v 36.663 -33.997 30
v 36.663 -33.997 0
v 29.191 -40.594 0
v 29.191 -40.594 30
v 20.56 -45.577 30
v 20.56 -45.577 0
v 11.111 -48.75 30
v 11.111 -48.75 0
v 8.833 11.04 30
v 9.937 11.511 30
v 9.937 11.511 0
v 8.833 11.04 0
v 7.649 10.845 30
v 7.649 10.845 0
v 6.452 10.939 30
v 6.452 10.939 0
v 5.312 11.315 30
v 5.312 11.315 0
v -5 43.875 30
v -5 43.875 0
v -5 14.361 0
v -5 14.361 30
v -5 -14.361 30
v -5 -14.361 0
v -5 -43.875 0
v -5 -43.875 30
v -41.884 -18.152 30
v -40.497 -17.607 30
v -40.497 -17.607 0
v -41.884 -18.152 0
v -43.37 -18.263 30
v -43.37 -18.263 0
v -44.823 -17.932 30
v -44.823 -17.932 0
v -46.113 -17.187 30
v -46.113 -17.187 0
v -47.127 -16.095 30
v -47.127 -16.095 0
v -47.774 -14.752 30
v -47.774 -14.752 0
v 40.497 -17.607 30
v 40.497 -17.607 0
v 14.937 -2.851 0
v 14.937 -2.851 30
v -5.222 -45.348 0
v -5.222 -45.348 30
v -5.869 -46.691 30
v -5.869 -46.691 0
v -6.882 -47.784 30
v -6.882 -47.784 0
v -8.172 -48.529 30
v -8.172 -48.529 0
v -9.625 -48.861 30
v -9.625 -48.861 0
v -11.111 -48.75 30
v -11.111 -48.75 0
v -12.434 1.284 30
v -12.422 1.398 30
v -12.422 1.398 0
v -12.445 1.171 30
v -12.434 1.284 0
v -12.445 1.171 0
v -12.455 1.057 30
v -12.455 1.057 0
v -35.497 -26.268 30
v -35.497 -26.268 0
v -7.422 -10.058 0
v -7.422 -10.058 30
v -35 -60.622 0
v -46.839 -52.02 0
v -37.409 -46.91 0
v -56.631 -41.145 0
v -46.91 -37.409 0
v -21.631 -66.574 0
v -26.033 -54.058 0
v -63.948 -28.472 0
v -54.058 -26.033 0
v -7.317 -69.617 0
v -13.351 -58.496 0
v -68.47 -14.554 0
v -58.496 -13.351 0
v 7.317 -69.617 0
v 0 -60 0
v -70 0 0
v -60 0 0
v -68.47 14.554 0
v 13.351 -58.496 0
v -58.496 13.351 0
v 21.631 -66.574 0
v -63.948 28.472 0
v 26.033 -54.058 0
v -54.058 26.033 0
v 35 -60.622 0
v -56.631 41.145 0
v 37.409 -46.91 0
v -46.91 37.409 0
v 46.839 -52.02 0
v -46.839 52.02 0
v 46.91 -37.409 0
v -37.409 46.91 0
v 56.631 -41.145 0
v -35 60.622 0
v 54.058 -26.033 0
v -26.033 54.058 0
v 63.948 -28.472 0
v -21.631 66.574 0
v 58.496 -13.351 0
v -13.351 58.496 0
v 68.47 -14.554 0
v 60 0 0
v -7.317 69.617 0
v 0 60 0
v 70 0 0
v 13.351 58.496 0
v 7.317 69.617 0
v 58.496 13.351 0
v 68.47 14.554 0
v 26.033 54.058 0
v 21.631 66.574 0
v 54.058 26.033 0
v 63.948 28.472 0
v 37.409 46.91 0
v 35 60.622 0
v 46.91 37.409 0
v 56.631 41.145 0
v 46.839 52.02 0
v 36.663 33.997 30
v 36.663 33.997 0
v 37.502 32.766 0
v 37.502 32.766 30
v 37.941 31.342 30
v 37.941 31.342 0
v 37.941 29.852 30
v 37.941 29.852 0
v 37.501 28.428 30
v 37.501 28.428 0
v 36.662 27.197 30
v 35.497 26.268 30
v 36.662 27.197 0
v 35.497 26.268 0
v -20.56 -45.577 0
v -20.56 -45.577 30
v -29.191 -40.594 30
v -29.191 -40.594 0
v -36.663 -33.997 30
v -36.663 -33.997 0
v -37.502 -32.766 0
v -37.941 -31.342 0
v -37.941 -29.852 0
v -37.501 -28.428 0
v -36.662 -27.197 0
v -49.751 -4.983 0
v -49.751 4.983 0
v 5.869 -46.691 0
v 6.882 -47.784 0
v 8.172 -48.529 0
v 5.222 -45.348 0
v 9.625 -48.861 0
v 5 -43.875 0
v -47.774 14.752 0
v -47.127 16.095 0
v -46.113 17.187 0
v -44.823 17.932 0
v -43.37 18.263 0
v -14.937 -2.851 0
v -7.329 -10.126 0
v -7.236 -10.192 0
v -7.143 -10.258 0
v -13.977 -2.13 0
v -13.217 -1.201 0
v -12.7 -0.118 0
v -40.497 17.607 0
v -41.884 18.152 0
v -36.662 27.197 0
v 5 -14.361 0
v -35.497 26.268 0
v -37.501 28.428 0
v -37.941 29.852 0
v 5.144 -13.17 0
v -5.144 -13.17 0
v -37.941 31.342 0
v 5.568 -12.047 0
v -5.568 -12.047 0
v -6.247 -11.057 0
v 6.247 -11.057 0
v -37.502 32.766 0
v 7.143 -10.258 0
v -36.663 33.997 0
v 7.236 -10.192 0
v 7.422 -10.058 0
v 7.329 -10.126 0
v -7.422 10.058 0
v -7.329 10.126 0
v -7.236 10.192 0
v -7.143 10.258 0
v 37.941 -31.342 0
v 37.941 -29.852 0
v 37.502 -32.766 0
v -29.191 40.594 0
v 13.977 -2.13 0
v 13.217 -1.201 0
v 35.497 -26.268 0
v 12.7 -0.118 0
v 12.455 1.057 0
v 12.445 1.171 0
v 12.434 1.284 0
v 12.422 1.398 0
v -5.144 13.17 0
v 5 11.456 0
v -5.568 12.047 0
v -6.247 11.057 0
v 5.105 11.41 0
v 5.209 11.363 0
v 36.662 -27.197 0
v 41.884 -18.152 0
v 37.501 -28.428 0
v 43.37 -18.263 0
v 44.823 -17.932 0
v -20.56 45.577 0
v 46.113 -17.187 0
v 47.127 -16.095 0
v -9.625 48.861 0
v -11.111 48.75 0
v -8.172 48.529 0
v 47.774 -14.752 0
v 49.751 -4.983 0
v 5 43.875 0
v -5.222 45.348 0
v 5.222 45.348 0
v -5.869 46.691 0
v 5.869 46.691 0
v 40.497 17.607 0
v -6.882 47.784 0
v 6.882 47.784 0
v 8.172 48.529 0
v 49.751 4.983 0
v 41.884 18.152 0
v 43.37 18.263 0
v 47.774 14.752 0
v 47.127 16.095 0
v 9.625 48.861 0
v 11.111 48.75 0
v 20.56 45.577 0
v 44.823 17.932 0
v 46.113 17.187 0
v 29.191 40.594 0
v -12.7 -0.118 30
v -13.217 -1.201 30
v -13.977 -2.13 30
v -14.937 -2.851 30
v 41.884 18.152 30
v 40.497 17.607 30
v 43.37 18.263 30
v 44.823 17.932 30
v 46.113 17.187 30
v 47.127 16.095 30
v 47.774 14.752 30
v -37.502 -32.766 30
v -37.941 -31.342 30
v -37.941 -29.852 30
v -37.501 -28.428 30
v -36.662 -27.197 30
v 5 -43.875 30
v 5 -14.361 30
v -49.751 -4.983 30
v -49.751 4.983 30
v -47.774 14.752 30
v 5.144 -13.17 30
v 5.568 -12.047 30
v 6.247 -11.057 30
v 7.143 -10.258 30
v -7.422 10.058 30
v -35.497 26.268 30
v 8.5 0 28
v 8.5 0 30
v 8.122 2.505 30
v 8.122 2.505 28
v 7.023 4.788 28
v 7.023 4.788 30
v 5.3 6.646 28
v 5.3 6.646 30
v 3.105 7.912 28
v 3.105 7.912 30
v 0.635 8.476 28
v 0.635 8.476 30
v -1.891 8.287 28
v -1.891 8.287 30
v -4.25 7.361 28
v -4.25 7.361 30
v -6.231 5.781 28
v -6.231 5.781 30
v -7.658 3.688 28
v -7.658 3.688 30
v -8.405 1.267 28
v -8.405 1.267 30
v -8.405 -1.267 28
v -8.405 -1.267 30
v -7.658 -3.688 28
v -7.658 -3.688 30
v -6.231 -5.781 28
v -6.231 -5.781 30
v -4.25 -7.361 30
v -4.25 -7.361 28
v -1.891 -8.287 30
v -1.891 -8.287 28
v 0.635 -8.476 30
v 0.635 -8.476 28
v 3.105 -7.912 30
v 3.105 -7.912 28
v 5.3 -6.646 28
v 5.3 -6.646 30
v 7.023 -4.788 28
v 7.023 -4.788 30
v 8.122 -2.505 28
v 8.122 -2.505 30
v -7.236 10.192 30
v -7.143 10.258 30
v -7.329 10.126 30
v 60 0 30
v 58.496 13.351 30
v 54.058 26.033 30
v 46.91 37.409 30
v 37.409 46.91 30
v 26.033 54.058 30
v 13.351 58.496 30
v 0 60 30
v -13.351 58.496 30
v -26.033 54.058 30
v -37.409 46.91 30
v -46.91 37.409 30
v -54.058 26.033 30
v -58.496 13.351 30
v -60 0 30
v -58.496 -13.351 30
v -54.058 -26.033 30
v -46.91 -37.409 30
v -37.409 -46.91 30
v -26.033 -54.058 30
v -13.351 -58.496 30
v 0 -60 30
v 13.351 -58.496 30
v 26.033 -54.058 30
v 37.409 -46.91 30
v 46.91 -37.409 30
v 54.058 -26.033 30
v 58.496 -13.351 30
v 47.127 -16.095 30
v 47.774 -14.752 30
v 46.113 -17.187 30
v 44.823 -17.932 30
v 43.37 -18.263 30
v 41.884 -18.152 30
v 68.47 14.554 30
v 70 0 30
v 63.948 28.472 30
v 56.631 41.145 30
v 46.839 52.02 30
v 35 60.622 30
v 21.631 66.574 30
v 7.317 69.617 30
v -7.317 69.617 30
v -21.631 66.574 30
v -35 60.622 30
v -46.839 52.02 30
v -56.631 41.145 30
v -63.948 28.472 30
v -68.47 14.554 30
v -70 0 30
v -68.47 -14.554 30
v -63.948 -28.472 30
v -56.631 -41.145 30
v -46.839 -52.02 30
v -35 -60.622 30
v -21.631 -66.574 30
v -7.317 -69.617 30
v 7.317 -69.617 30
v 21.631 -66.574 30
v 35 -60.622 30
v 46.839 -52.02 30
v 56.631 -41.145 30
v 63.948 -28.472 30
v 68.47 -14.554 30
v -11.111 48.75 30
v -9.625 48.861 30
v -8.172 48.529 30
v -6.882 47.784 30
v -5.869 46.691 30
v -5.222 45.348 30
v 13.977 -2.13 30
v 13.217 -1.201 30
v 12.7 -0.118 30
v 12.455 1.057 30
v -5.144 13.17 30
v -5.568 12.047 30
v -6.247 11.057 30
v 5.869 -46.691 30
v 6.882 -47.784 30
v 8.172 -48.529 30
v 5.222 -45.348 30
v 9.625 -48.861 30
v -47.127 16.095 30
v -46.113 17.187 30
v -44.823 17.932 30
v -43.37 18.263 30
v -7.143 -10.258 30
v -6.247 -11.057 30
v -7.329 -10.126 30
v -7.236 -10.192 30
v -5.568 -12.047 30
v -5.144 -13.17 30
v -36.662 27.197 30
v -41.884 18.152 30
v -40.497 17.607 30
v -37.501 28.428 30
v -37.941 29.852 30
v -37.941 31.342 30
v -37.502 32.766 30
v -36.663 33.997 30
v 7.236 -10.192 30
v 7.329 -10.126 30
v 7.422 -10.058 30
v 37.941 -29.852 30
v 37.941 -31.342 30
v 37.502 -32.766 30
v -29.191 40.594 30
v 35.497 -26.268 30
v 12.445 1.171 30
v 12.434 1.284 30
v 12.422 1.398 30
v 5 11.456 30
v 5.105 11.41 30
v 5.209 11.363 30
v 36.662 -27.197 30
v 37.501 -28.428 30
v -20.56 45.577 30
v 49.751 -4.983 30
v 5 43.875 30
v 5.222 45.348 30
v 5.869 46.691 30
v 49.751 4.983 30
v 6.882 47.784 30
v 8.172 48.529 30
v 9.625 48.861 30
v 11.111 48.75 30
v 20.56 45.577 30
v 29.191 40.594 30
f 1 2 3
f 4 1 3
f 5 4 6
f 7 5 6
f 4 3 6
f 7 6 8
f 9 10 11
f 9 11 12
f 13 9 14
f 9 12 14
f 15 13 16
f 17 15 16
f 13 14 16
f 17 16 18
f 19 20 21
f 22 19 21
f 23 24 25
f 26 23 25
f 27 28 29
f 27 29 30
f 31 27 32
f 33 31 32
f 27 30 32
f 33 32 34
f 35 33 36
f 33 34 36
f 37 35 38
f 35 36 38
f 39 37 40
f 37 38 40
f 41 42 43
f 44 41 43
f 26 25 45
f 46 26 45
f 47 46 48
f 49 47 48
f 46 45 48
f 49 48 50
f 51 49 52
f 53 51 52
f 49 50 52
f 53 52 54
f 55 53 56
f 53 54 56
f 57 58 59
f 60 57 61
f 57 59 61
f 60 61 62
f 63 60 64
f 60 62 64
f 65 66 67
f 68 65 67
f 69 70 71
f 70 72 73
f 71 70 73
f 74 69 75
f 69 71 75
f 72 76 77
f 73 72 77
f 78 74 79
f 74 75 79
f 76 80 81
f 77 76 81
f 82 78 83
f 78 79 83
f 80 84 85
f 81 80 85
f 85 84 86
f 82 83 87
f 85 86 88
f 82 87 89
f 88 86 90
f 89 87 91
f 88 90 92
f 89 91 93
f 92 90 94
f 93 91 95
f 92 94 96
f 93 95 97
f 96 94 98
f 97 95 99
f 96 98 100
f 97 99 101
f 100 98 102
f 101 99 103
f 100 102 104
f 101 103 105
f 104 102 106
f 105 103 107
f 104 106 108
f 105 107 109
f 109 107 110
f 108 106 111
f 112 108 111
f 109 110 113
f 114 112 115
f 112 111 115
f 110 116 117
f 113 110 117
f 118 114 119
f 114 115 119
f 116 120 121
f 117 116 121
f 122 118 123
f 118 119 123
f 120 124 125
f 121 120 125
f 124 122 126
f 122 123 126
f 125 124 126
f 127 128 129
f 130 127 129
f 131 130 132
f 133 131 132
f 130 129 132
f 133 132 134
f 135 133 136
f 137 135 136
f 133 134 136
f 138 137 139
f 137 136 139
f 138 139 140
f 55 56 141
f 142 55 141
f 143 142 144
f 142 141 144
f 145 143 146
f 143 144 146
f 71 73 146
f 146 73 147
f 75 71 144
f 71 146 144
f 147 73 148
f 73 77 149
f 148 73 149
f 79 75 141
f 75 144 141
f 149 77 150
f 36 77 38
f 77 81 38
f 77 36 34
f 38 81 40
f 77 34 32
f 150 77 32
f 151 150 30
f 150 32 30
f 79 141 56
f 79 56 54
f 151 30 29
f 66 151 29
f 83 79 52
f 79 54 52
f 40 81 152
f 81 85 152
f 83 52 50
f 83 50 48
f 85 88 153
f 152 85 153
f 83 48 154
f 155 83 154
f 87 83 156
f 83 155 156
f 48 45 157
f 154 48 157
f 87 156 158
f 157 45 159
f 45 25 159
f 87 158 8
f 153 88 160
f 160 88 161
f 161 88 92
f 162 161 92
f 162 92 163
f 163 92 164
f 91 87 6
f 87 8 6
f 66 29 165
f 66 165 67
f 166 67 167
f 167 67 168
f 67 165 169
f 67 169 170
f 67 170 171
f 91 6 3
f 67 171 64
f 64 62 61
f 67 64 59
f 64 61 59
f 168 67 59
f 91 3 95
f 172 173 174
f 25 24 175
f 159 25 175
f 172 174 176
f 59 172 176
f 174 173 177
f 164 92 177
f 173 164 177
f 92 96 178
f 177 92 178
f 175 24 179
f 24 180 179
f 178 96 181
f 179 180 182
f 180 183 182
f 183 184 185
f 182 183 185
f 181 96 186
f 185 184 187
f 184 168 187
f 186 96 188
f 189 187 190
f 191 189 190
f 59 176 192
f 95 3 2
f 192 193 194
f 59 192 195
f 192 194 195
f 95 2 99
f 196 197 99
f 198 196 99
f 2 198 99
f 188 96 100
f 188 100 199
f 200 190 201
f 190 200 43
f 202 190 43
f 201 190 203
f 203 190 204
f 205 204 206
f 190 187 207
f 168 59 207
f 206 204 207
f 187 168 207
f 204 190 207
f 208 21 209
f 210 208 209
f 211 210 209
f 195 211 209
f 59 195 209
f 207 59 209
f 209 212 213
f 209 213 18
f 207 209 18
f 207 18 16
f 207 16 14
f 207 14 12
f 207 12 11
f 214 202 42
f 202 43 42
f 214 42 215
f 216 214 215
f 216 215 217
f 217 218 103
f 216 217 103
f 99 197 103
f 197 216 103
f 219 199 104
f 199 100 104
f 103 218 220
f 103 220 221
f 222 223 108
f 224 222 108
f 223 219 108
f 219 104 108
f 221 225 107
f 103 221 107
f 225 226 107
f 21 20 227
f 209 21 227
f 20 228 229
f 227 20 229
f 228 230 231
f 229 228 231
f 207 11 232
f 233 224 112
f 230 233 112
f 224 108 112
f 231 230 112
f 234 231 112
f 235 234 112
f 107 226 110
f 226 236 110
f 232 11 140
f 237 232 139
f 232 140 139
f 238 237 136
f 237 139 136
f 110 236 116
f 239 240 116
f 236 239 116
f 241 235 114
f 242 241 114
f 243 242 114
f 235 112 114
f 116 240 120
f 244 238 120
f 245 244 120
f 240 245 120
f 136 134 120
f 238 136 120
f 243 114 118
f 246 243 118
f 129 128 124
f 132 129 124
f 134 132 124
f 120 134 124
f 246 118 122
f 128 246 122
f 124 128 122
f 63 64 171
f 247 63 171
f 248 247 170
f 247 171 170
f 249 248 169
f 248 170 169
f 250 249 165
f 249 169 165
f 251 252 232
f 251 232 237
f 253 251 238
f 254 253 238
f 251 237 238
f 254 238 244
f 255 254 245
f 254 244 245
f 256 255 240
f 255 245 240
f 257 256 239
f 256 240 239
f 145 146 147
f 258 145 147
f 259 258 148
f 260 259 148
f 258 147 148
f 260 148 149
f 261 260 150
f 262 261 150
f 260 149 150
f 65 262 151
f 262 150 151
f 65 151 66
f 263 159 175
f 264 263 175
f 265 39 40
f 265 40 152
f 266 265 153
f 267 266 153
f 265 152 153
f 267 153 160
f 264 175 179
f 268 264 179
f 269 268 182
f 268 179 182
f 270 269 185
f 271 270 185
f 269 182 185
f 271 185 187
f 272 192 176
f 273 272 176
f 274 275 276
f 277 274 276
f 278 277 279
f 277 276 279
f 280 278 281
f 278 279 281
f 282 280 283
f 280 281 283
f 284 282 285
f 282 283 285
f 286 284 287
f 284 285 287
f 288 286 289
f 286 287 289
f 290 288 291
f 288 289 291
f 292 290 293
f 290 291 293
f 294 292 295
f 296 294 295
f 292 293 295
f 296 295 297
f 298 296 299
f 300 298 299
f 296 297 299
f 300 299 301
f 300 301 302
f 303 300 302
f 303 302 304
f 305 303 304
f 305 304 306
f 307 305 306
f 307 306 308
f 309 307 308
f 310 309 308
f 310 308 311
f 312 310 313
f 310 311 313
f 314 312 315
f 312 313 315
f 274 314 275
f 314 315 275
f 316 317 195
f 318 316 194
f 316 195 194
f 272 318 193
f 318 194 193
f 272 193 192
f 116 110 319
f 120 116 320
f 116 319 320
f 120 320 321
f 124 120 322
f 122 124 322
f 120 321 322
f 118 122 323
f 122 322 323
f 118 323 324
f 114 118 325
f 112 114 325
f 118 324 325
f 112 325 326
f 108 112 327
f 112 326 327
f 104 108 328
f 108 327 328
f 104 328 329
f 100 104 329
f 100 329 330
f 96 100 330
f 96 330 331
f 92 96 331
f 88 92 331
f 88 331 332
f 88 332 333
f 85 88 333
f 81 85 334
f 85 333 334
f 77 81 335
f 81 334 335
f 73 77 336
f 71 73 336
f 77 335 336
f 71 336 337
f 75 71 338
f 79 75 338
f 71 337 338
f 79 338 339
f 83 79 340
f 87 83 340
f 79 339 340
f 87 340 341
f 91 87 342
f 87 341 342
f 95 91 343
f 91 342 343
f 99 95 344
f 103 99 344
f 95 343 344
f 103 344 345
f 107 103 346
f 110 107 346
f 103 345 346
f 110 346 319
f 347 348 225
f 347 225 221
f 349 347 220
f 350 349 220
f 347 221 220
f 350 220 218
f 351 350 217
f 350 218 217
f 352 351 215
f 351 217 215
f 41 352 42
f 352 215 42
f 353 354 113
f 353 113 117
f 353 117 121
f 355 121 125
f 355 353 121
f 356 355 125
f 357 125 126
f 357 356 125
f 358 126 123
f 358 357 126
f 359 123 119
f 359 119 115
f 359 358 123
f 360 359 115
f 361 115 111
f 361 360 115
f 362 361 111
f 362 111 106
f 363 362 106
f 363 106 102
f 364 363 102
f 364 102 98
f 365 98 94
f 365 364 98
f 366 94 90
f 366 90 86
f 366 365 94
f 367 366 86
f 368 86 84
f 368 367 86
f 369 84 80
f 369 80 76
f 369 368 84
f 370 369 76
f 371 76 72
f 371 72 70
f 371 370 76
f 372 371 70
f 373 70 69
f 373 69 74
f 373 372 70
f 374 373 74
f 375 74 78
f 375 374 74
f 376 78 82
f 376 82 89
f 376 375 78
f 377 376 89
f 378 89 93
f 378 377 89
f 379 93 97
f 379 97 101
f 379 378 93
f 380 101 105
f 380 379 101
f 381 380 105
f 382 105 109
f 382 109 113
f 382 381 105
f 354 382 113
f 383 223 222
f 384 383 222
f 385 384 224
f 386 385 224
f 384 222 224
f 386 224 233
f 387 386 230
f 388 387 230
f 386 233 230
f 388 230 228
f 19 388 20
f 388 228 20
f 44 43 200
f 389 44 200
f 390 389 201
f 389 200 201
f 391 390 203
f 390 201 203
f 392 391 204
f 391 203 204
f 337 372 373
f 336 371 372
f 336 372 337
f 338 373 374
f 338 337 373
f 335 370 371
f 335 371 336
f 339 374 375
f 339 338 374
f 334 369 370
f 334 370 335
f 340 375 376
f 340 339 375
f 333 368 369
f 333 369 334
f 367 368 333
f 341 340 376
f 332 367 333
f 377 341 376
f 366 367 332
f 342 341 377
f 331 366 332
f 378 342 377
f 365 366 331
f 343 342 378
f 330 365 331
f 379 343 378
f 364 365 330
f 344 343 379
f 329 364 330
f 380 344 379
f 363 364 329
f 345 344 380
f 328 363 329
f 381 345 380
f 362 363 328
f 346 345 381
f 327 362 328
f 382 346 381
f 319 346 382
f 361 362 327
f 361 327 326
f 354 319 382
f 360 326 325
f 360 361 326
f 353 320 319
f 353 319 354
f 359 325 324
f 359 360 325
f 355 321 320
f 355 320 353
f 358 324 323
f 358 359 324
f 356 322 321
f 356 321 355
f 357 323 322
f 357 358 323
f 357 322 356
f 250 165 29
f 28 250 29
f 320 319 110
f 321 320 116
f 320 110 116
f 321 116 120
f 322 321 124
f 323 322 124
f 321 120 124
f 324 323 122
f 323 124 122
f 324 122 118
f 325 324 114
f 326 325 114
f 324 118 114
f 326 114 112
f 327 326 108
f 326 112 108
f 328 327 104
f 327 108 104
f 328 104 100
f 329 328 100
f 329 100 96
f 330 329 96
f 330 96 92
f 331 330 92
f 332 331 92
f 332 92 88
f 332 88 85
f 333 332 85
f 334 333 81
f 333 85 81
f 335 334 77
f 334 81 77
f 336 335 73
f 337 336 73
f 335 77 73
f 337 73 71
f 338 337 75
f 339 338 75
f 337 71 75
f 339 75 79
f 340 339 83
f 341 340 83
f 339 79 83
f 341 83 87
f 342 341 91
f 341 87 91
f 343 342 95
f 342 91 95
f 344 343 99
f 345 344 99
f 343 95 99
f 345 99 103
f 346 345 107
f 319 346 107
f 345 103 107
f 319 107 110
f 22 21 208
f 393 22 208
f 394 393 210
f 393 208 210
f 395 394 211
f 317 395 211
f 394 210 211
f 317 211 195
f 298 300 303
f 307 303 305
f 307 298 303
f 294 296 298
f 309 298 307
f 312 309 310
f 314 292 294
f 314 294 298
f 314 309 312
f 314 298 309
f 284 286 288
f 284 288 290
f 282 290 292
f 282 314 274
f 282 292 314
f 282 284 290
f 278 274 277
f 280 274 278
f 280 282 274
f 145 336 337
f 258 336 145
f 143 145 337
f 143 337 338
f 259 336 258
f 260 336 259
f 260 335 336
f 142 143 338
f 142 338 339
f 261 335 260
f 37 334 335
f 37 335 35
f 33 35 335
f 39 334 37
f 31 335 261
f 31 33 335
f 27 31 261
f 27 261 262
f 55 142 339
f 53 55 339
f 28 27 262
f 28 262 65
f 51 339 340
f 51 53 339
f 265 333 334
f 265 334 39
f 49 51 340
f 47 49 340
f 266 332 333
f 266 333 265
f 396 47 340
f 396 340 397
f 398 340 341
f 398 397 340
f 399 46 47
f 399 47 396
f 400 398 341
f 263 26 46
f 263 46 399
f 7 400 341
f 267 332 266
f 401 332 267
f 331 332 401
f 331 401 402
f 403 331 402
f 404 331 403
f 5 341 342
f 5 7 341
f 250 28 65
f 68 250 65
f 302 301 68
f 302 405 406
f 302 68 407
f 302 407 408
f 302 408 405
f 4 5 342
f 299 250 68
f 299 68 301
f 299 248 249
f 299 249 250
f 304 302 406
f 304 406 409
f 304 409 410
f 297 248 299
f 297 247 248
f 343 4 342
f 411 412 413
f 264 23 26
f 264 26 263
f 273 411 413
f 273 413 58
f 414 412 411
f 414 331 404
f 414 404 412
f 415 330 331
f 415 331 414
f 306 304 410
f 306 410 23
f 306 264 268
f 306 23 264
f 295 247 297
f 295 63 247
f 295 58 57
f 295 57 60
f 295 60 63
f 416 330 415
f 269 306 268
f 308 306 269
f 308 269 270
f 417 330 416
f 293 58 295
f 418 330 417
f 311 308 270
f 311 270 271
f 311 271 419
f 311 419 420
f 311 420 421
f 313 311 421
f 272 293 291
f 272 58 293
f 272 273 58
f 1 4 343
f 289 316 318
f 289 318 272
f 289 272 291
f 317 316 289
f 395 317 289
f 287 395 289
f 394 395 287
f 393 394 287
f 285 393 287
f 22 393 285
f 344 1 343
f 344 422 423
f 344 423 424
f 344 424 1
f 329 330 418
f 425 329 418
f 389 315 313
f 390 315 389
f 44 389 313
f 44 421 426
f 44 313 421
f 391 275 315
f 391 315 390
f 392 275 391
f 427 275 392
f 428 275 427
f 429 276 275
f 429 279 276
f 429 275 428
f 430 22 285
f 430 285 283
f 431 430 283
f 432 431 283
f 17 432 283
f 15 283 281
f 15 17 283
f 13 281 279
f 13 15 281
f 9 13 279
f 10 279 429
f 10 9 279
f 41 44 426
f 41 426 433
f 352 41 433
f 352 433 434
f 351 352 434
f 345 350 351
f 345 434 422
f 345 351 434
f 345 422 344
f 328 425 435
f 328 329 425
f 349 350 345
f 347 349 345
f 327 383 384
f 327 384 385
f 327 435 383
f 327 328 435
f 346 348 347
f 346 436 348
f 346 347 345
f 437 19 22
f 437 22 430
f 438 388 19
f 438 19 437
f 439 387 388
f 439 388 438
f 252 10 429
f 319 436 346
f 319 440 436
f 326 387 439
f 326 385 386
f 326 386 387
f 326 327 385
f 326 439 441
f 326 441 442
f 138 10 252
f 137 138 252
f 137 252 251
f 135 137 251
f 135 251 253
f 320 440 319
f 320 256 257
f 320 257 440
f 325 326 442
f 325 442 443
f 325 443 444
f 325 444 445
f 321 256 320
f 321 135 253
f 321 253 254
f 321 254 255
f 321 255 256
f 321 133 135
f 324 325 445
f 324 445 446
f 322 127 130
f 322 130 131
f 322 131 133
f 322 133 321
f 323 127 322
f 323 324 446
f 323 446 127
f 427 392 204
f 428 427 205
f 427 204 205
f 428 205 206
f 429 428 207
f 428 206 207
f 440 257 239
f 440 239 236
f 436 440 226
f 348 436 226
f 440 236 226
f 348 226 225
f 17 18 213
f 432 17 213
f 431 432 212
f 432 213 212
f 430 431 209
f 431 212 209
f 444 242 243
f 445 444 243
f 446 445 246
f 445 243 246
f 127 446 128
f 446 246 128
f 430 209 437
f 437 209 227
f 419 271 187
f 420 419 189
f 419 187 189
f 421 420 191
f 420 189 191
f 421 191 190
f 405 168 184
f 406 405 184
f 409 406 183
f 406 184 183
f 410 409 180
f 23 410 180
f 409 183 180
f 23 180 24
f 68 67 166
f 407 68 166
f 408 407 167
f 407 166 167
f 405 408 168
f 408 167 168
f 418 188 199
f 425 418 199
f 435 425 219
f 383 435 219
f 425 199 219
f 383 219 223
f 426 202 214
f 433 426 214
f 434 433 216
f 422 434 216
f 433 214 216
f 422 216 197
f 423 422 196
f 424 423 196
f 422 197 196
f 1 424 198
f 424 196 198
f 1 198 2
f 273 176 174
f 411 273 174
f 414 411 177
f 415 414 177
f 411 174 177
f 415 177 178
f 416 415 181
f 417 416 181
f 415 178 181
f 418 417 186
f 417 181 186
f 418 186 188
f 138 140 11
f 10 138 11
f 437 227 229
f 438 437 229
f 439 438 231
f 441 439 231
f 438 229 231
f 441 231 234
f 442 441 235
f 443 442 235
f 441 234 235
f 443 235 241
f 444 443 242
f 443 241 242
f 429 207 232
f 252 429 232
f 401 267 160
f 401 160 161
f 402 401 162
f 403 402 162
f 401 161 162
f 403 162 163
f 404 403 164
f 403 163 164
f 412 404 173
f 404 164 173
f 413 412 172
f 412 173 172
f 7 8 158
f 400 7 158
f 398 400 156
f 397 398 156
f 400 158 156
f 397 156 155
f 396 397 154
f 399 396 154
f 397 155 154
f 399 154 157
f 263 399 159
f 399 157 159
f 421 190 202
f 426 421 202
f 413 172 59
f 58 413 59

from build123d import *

# Parameters (mm, degrees)
SKETCH_1_R          = 60
EXTRUDE_1_DEPTH     = 30
SKETCH_2_R          = 70
SKETCH_2_R_2        = 60
EXTRUDE_2_DEPTH     = 30
SKETCH_3_R          = 8.5
CUT_EXTRUDE_1_DEPTH = 2


with BuildPart() as part:
    # ｽｹｯﾁ1 → ﾎﾞｽ - 押し出し1 (new body)
    with BuildSketch(Plane.XY):
        Circle(SKETCH_1_R)
        with BuildLine():
            Line((-5, 43.874821937), (-5, 14.361406616))
            ThreePointArc((-5, 14.361406616), (-5.567973698, 12.046856367), (-7.142857143, 10.258147583))
            ThreePointArc((-7.142857143, 10.258147583), (-7.282897486, 10.159202932), (-7.421567416, 10.058346638))
            Line((-7.421567416, 10.058346638), (-35.496710384, 26.267537987))
            ThreePointArc((-35.496710384, 26.267537987), (-37.940750297, 29.851696282), (-36.663011538, 33.997405563))
            ThreePointArc((-36.663011538, 33.997405563), (-25, 43.301270189), (-11.111111111, 48.749802152))
            ThreePointArc((-11.111111111, 48.749802152), (-6.881952178, 47.783501737), (-5, 43.874821937))
        make_face(mode=Mode.SUBTRACT)
        with BuildLine():
            Line((-5, -14.361406616), (-5, -43.874821937))
            ThreePointArc((-5, -43.874821937), (-6.881952178, -47.783501737), (-11.111111111, -48.749802152))
            ThreePointArc((-11.111111111, -48.749802152), (-25, -43.301270189), (-36.663011538, -33.997405563))
            ThreePointArc((-36.663011538, -33.997405563), (-37.940750297, -29.851696282), (-35.496710384, -26.267537987))
            Line((-35.496710384, -26.267537987), (-7.421567416, -10.058346638))
            ThreePointArc((-7.421567416, -10.058346638), (-7.282897486, -10.159202932), (-7.142857143, -10.258147583))
            ThreePointArc((-7.142857143, -10.258147583), (-5.567973698, -12.046856367), (-5, -14.361406616))
        make_face(mode=Mode.SUBTRACT)
        with BuildLine():
            Line((35.496710384, 26.267537987), (9.937342964, 11.510830327))
            ThreePointArc((9.937342964, 11.510830327), (7.648896801, 10.845434853), (5.312387831, 11.314969533))
            ThreePointArc((5.312387831, 11.314969533), (5.156679078, 11.386775702), (5, 11.456439237))
            Line((5, 11.456439237), (5, 43.874821937))
            ThreePointArc((5, 43.874821937), (6.881952178, 47.783501737), (11.111111111, 48.749802152))
            ThreePointArc((11.111111111, 48.749802152), (25, 43.301270189), (36.663011538, 33.997405563))
            ThreePointArc((36.663011538, 33.997405563), (37.940750297, 29.851696282), (35.496710384, 26.267537987))
        make_face(mode=Mode.SUBTRACT)
        with BuildLine():
            Line((-14.937342964, -2.850576289), (-40.496710384, -17.60728395))
            ThreePointArc((-40.496710384, -17.60728395), (-44.822702475, -17.931805455), (-47.774122649, -14.75239659))
            ThreePointArc((-47.774122649, -14.75239659), (-50, 0), (-47.774122649, 14.75239659))
            ThreePointArc((-47.774122649, 14.75239659), (-44.822702475, 17.931805455), (-40.496710384, 17.60728395))
            Line((-40.496710384, 17.60728395), (-12.421567416, 1.3980926))
            ThreePointArc((-12.421567416, 1.3980926), (-12.439576564, 1.22757277), (-12.455244974, 1.05682195))
            ThreePointArc((-12.455244974, 1.05682195), (-13.216870498, -1.201421514), (-14.937342964, -2.850576289))
        make_face(mode=Mode.SUBTRACT)
        with BuildLine():
            Line((40.496710384, -17.60728395), (14.937342964, -2.850576289))
            ThreePointArc((14.937342964, -2.850576289), (13.216870498, -1.201421514), (12.455244974, 1.05682195))
            ThreePointArc((12.455244974, 1.05682195), (12.439576564, 1.22757277), (12.421567416, 1.3980926))
            Line((12.421567416, 1.3980926), (40.496710384, 17.60728395))
            ThreePointArc((40.496710384, 17.60728395), (44.822702475, 17.931805455), (47.774122649, 14.75239659))
            ThreePointArc((47.774122649, 14.75239659), (50, 0), (47.774122649, -14.75239659))
            ThreePointArc((47.774122649, -14.75239659), (44.822702475, -17.931805455), (40.496710384, -17.60728395))
        make_face(mode=Mode.SUBTRACT)
        with BuildLine():
            Line((5, -43.874821937), (5, -14.361406616))
            ThreePointArc((5, -14.361406616), (5.567973698, -12.046856367), (7.142857143, -10.258147583))
            ThreePointArc((7.142857143, -10.258147583), (7.282897486, -10.159202932), (7.421567416, -10.058346638))
            Line((7.421567416, -10.058346638), (35.496710384, -26.267537987))
            ThreePointArc((35.496710384, -26.267537987), (37.940750297, -29.851696282), (36.663011538, -33.997405563))
            ThreePointArc((36.663011538, -33.997405563), (25, -43.301270189), (11.111111111, -48.749802152))
            ThreePointArc((11.111111111, -48.749802152), (6.881952178, -47.783501737), (5, -43.874821937))
        make_face(mode=Mode.SUBTRACT)
    extrude(amount=EXTRUDE_1_DEPTH)

    # ｽｹｯﾁ3 → ｶｯﾄ - 押し出し1 (cut)
    with BuildSketch(Plane.XY.offset(30)):
        Circle(SKETCH_3_R)
    extrude(amount=-CUT_EXTRUDE_1_DEPTH, mode=Mode.SUBTRACT)


with BuildPart() as body_2:
    # ｽｹｯﾁ2 → ﾎﾞｽ - 押し出し2 (new body)
    with BuildSketch(Plane.XY.offset(30)):
        Circle(SKETCH_2_R)
        Circle(SKETCH_2_R_2, mode=Mode.SUBTRACT)
    extrude(amount=-EXTRUDE_2_DEPTH)


solid = Compound([part.part, body_2.part])
